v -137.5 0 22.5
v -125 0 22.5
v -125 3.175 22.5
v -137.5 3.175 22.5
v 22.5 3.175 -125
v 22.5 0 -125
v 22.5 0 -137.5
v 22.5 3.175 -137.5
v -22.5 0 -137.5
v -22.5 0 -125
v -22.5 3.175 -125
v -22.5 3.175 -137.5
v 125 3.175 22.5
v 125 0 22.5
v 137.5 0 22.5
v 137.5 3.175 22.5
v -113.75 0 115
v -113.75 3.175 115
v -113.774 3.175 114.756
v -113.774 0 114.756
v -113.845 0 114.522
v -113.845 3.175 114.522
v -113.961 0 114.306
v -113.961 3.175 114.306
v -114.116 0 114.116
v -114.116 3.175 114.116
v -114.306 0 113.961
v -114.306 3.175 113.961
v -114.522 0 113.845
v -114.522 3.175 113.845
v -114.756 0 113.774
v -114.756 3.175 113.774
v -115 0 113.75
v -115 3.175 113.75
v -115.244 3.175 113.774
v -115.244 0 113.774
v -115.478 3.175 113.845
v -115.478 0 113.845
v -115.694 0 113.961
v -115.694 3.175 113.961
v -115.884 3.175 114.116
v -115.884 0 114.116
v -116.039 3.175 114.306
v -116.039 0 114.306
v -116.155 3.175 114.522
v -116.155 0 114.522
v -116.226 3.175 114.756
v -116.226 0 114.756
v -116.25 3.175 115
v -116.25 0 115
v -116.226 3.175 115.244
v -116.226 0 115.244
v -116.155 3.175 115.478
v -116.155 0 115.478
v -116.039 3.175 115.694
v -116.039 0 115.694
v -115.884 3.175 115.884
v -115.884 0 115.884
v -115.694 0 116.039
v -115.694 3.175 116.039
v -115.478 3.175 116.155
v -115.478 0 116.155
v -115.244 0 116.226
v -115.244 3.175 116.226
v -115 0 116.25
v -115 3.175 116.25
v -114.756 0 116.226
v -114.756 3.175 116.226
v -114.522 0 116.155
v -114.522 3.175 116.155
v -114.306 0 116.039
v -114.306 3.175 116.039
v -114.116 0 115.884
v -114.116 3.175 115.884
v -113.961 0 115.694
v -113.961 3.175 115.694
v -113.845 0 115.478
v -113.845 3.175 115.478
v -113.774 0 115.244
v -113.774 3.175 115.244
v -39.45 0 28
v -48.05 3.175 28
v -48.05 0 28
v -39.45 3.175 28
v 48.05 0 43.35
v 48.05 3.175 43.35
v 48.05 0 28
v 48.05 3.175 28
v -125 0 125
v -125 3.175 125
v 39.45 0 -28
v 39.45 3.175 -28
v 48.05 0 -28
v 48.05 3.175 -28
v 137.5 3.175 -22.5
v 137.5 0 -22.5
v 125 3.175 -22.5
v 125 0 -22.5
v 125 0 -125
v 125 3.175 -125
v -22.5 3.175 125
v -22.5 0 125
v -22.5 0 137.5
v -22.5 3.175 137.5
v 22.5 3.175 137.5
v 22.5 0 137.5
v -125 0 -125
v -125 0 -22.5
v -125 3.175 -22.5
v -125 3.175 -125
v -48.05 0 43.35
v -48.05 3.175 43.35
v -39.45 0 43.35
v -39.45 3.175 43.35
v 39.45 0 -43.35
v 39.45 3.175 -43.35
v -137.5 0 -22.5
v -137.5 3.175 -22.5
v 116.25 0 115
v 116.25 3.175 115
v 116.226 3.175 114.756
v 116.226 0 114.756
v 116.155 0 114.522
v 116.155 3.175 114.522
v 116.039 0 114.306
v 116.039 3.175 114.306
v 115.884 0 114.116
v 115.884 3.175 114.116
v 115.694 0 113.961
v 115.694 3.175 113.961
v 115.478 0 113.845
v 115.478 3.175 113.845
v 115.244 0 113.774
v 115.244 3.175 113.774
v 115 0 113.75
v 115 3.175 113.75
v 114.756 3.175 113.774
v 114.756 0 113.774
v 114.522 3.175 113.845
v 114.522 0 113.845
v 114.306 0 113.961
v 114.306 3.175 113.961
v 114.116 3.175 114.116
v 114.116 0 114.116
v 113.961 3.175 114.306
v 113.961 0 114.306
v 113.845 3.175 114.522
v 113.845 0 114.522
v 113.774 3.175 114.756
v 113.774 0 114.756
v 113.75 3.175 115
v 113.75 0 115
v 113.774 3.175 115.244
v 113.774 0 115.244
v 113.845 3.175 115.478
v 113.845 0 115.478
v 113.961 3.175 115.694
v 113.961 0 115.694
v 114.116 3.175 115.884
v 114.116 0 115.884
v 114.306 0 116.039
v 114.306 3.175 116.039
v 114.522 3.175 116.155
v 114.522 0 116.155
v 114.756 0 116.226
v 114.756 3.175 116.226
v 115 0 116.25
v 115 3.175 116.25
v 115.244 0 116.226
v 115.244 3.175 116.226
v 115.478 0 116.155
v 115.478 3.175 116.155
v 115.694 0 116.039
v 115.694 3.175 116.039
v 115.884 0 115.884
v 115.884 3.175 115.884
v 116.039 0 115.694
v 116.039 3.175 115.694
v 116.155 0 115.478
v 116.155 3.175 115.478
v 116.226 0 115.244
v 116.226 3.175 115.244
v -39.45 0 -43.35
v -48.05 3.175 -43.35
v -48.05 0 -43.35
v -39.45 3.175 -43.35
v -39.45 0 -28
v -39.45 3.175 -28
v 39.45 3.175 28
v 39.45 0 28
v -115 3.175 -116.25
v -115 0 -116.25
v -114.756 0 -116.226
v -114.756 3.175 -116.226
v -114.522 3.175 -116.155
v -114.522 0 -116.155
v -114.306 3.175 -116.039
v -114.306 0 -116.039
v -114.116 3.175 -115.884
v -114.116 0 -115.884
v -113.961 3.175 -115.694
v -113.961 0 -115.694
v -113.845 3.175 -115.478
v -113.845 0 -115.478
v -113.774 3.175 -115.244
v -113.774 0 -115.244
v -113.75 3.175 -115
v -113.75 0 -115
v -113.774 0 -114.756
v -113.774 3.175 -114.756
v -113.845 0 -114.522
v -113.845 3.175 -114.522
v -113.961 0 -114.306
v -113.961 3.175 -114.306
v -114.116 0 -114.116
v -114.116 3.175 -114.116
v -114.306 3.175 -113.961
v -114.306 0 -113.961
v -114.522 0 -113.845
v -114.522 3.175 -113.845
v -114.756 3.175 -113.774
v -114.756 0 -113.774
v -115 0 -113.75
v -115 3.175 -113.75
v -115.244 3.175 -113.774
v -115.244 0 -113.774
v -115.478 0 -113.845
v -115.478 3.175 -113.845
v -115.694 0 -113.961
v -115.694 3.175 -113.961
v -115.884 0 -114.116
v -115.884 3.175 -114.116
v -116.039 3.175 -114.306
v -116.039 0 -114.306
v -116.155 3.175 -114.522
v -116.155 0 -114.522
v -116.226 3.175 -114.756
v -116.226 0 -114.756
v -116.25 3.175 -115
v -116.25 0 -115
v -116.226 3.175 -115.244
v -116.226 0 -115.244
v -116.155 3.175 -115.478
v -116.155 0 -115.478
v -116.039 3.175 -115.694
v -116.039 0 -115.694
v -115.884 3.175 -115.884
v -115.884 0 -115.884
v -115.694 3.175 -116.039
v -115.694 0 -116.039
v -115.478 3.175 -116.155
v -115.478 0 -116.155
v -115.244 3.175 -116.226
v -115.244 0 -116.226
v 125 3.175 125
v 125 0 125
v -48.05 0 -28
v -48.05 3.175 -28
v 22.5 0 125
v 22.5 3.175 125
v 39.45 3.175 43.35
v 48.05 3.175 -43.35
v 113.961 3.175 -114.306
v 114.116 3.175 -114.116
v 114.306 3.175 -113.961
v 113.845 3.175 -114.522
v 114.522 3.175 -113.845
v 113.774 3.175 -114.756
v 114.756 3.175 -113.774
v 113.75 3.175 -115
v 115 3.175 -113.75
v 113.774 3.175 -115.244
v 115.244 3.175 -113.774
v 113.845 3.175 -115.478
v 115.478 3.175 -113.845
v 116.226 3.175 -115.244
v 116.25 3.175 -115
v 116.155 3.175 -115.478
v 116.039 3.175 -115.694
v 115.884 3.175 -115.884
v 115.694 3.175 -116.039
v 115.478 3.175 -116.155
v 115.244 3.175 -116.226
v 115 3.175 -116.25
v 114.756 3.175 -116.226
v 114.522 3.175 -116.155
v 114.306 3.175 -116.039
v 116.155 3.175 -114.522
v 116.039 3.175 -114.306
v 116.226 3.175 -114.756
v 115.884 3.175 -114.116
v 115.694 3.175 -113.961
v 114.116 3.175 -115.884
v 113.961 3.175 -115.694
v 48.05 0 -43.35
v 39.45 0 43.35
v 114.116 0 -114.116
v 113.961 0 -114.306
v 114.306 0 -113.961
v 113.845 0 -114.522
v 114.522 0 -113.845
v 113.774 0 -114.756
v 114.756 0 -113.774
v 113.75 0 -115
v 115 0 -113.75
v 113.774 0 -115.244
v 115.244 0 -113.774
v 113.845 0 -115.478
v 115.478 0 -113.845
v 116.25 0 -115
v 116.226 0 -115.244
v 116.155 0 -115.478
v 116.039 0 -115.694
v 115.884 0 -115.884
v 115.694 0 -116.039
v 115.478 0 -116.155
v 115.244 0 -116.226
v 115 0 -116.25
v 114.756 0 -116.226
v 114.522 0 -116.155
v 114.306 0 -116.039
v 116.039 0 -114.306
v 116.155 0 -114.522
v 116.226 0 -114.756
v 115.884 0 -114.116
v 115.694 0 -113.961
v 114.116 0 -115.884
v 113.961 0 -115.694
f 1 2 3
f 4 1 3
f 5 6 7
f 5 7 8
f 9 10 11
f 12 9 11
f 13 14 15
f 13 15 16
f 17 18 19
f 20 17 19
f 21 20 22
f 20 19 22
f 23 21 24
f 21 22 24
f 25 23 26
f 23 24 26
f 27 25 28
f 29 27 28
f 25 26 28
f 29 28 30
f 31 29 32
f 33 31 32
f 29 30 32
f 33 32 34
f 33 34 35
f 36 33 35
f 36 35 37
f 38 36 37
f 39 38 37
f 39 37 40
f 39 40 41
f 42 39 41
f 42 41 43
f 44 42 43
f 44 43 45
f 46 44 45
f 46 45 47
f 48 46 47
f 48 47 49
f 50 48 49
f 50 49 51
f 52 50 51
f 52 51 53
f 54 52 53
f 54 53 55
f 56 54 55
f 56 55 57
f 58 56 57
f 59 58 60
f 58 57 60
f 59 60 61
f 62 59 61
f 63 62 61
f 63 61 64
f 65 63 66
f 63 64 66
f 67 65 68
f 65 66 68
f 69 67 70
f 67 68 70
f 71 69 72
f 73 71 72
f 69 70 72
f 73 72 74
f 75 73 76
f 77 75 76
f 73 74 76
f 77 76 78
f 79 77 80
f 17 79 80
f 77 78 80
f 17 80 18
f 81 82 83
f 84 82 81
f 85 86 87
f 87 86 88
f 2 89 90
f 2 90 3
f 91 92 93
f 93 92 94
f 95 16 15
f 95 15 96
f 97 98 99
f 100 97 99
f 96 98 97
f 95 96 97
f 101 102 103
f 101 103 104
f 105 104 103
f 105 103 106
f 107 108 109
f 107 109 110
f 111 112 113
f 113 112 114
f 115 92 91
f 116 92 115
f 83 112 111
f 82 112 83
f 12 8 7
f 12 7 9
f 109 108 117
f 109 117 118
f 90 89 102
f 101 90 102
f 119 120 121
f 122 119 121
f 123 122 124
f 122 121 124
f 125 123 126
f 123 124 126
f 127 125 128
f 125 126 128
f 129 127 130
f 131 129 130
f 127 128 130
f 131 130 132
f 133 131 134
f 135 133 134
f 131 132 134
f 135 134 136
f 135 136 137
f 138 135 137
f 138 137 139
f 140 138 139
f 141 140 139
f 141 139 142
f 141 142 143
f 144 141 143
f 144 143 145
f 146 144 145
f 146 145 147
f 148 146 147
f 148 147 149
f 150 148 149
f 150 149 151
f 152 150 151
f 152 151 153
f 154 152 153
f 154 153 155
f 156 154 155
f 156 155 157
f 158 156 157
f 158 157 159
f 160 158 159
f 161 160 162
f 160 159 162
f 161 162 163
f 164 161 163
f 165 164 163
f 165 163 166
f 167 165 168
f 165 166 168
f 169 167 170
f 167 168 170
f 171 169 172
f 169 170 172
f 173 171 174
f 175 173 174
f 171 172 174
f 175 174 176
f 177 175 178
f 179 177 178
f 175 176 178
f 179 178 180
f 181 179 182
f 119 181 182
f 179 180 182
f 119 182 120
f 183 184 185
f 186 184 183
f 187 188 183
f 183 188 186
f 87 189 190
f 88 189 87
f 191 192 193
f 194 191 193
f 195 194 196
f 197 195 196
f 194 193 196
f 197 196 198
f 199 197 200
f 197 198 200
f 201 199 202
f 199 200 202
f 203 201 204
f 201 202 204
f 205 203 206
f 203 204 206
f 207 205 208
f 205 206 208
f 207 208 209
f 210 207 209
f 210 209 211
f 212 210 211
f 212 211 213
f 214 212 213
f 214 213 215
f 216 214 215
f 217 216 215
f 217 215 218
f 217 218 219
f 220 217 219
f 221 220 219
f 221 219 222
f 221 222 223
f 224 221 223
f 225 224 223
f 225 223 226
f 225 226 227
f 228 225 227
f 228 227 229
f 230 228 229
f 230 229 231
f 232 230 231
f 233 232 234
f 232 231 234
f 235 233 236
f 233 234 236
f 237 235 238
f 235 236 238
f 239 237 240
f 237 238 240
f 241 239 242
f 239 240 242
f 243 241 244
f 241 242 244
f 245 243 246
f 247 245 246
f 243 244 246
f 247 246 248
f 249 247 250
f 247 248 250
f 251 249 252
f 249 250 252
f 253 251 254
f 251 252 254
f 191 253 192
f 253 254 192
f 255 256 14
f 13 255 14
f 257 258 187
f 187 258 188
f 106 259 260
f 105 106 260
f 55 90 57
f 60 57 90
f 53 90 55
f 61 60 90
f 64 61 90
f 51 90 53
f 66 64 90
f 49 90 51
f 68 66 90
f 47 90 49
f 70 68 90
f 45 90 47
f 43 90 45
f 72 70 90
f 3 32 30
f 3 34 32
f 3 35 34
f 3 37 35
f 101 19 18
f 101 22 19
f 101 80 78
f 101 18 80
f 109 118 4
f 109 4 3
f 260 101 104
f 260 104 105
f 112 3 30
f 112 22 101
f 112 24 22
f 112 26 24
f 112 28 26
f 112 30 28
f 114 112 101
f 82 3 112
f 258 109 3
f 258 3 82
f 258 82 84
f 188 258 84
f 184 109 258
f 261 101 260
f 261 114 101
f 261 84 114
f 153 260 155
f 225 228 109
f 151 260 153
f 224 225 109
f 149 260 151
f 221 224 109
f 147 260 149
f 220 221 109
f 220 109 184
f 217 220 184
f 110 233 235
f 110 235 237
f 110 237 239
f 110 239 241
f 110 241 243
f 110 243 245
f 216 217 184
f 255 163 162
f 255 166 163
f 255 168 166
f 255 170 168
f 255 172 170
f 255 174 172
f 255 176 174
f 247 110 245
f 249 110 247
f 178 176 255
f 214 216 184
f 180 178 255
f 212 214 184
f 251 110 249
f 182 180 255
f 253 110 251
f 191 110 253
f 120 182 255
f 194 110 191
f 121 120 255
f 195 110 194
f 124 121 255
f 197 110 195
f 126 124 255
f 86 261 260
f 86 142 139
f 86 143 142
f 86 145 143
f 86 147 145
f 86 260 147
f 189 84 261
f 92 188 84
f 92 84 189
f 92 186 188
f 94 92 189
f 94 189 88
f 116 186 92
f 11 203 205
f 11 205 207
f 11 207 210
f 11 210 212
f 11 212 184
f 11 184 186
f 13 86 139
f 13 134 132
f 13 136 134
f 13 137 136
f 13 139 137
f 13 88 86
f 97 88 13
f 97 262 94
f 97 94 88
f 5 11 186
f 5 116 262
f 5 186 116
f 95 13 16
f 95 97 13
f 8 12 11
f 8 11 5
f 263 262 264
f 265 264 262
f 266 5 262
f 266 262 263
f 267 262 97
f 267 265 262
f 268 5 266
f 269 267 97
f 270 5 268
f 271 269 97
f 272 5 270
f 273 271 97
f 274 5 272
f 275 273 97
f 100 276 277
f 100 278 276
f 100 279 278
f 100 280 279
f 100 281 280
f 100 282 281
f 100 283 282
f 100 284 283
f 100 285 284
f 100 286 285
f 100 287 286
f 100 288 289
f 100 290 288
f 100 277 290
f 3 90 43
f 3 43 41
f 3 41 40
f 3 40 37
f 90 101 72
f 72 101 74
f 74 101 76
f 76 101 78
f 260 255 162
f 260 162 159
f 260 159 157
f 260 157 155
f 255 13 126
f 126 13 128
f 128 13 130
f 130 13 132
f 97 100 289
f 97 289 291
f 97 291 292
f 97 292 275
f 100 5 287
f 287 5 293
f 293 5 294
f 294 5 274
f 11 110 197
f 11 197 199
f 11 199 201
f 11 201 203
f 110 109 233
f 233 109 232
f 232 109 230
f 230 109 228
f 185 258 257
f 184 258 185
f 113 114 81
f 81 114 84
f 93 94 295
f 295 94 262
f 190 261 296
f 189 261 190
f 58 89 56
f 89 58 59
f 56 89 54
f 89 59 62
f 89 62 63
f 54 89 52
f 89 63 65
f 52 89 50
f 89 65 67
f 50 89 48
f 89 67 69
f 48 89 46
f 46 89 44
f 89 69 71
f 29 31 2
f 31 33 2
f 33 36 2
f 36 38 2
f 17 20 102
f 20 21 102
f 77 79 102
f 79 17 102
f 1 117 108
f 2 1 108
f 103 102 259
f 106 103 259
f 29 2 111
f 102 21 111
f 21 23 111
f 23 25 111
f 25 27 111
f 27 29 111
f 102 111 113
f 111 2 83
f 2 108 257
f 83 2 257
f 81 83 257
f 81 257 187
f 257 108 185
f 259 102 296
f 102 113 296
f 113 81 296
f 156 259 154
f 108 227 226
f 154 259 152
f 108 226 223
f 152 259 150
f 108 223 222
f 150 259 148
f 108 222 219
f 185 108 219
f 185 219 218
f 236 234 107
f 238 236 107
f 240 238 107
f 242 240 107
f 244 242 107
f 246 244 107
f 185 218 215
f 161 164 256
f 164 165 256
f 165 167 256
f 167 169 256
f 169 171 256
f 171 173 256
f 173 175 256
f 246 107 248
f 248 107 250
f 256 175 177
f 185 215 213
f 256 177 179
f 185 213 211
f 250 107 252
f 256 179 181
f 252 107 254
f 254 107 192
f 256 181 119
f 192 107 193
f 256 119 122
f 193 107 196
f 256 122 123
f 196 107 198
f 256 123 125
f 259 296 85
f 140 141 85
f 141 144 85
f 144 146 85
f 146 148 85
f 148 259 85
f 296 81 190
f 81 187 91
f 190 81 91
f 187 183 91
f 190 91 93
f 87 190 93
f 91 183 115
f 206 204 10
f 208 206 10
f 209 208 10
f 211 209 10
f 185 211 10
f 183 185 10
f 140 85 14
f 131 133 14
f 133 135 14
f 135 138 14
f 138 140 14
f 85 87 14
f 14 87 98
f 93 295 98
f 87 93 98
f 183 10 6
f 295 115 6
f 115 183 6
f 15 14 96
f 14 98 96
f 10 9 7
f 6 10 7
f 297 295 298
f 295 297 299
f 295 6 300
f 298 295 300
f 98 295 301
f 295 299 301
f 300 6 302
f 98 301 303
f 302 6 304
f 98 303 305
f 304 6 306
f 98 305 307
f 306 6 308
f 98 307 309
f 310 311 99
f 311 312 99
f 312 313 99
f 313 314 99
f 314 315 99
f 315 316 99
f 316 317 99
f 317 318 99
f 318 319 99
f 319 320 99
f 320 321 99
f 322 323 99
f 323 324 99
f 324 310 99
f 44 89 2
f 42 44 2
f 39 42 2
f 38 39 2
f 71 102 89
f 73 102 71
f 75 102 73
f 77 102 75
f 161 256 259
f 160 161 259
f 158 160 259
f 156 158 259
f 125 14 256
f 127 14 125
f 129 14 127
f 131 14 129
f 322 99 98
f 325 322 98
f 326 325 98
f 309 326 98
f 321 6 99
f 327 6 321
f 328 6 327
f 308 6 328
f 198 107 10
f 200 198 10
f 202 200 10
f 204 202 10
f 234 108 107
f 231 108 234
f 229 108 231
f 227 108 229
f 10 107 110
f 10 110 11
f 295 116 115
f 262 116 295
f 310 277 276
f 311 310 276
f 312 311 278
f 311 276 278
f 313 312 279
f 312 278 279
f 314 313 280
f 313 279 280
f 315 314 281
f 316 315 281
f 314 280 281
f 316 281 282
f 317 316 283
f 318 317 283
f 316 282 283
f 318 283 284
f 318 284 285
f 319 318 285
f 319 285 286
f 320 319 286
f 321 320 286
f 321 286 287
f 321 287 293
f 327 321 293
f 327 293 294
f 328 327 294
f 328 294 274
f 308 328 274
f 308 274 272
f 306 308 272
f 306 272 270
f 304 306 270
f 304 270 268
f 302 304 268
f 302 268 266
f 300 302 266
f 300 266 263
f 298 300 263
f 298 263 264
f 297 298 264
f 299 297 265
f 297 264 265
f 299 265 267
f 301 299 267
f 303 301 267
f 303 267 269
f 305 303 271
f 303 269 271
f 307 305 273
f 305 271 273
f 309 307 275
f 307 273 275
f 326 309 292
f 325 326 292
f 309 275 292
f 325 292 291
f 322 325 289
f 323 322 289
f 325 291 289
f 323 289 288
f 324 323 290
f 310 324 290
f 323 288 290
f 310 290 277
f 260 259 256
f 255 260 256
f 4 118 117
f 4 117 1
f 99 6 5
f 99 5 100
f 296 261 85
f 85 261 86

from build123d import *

# Parameters (mm, degrees)
SKETCH2_W           = 250
SKETCH2_H           = 250
BOSS_EXTRUDE1_DEPTH = 3.175
SKETCH3_W           = 8.6
SKETCH3_H           = 15.35
CUT_EXTRUDE1_DEPTH  = 10
SKETCH10_W          = 45
SKETCH10_H          = 3.175
BOSS_EXTRUDE2_DEPTH = 12.5
SKETCH11_W          = 45
SKETCH11_H          = 3.175
BOSS_EXTRUDE3_DEPTH = 12.5
SKETCH13_W          = 45
SKETCH13_H          = 3.175
BOSS_EXTRUDE4_DEPTH = 12.5
SKETCH14_W          = 45
SKETCH14_H          = 3.175
BOSS_EXTRUDE5_DEPTH = 12.5
M3_TAPPED_HOLE1_D   = 2.5
SKETCH21_R          = 1.25
CUT_EXTRUDE2_DEPTH  = 10


with BuildPart() as part:
    # Sketch2 → Boss-Extrude1 (new body)
    with BuildSketch(Plane(origin=(0, 0, 0), x_dir=(1, 0, 0), z_dir=(0, 1, 0))):
        Rectangle(SKETCH2_W, SKETCH2_H)
    extrude(amount=BOSS_EXTRUDE1_DEPTH)

    # Sketch3 → Cut-Extrude1 (cut)
    with BuildSketch(Plane(origin=(0, 3.175, 0), x_dir=(1, 0, 0), z_dir=(0, 1, 0))):
        with Locations((-43.75, 35.675)):
            Rectangle(SKETCH3_W, SKETCH3_H)
        with Locations((-43.75, -35.675)):
            Rectangle(SKETCH3_W, SKETCH3_H)
        with Locations((43.75, -35.675)):
            Rectangle(SKETCH3_W, SKETCH3_H)
        with Locations((43.75, 35.675)):
            Rectangle(SKETCH3_W, SKETCH3_H)
    extrude(amount=-CUT_EXTRUDE1_DEPTH, mode=Mode.SUBTRACT)

    # Sketch10 → Boss-Extrude2 (add)
    with BuildSketch(Plane(origin=(0, 0, -125), x_dir=(-1, 0, 0), z_dir=(0, 0, -1))):
        with Locations((0, 1.5875)):
            Rectangle(SKETCH10_W, SKETCH10_H)
    extrude(amount=BOSS_EXTRUDE2_DEPTH)

    # Sketch11 → Boss-Extrude3 (add)
    with BuildSketch(Plane.ZY.offset(125)):
        with Locations((0, 1.5875)):
            Rectangle(SKETCH11_W, SKETCH11_H)
    extrude(amount=BOSS_EXTRUDE3_DEPTH)

    # Sketch13 → Boss-Extrude4 (add)
    with BuildSketch(Plane.XY.offset(125)):
        with Locations((0, 1.5875)):
            Rectangle(SKETCH13_W, SKETCH13_H)
    extrude(amount=BOSS_EXTRUDE4_DEPTH)

    # Sketch14 → Boss-Extrude5 (add)
    with BuildSketch(Plane(origin=(125, 0, 0), x_dir=(0, 0, -1), z_dir=(1, 0, 0))):
        with Locations((0, 1.5875)):
            Rectangle(SKETCH14_W, SKETCH14_H)
    extrude(amount=BOSS_EXTRUDE5_DEPTH)

    # M3 Tapped Hole1 (through all)
    with Locations(Plane(origin=(-115, 3.175, -115), x_dir=(0, 0, 1), z_dir=(0, 1, 0))):
        with Locations((0, 0)):
            Hole(M3_TAPPED_HOLE1_D / 2)

    # Sketch21 → Cut-Extrude2 (cut)
    with BuildSketch(Plane(origin=(0, 3.175, 0), x_dir=(1, 0, 0), z_dir=(0, 1, 0))):
        with Locations((115, 115)):
            Circle(SKETCH21_R)
        with Locations((115, -115)):
            Circle(SKETCH21_R)
        with Locations((-115, -115)):
            Circle(SKETCH21_R)
    extrude(amount=-CUT_EXTRUDE2_DEPTH, mode=Mode.SUBTRACT)


solid = part.part
